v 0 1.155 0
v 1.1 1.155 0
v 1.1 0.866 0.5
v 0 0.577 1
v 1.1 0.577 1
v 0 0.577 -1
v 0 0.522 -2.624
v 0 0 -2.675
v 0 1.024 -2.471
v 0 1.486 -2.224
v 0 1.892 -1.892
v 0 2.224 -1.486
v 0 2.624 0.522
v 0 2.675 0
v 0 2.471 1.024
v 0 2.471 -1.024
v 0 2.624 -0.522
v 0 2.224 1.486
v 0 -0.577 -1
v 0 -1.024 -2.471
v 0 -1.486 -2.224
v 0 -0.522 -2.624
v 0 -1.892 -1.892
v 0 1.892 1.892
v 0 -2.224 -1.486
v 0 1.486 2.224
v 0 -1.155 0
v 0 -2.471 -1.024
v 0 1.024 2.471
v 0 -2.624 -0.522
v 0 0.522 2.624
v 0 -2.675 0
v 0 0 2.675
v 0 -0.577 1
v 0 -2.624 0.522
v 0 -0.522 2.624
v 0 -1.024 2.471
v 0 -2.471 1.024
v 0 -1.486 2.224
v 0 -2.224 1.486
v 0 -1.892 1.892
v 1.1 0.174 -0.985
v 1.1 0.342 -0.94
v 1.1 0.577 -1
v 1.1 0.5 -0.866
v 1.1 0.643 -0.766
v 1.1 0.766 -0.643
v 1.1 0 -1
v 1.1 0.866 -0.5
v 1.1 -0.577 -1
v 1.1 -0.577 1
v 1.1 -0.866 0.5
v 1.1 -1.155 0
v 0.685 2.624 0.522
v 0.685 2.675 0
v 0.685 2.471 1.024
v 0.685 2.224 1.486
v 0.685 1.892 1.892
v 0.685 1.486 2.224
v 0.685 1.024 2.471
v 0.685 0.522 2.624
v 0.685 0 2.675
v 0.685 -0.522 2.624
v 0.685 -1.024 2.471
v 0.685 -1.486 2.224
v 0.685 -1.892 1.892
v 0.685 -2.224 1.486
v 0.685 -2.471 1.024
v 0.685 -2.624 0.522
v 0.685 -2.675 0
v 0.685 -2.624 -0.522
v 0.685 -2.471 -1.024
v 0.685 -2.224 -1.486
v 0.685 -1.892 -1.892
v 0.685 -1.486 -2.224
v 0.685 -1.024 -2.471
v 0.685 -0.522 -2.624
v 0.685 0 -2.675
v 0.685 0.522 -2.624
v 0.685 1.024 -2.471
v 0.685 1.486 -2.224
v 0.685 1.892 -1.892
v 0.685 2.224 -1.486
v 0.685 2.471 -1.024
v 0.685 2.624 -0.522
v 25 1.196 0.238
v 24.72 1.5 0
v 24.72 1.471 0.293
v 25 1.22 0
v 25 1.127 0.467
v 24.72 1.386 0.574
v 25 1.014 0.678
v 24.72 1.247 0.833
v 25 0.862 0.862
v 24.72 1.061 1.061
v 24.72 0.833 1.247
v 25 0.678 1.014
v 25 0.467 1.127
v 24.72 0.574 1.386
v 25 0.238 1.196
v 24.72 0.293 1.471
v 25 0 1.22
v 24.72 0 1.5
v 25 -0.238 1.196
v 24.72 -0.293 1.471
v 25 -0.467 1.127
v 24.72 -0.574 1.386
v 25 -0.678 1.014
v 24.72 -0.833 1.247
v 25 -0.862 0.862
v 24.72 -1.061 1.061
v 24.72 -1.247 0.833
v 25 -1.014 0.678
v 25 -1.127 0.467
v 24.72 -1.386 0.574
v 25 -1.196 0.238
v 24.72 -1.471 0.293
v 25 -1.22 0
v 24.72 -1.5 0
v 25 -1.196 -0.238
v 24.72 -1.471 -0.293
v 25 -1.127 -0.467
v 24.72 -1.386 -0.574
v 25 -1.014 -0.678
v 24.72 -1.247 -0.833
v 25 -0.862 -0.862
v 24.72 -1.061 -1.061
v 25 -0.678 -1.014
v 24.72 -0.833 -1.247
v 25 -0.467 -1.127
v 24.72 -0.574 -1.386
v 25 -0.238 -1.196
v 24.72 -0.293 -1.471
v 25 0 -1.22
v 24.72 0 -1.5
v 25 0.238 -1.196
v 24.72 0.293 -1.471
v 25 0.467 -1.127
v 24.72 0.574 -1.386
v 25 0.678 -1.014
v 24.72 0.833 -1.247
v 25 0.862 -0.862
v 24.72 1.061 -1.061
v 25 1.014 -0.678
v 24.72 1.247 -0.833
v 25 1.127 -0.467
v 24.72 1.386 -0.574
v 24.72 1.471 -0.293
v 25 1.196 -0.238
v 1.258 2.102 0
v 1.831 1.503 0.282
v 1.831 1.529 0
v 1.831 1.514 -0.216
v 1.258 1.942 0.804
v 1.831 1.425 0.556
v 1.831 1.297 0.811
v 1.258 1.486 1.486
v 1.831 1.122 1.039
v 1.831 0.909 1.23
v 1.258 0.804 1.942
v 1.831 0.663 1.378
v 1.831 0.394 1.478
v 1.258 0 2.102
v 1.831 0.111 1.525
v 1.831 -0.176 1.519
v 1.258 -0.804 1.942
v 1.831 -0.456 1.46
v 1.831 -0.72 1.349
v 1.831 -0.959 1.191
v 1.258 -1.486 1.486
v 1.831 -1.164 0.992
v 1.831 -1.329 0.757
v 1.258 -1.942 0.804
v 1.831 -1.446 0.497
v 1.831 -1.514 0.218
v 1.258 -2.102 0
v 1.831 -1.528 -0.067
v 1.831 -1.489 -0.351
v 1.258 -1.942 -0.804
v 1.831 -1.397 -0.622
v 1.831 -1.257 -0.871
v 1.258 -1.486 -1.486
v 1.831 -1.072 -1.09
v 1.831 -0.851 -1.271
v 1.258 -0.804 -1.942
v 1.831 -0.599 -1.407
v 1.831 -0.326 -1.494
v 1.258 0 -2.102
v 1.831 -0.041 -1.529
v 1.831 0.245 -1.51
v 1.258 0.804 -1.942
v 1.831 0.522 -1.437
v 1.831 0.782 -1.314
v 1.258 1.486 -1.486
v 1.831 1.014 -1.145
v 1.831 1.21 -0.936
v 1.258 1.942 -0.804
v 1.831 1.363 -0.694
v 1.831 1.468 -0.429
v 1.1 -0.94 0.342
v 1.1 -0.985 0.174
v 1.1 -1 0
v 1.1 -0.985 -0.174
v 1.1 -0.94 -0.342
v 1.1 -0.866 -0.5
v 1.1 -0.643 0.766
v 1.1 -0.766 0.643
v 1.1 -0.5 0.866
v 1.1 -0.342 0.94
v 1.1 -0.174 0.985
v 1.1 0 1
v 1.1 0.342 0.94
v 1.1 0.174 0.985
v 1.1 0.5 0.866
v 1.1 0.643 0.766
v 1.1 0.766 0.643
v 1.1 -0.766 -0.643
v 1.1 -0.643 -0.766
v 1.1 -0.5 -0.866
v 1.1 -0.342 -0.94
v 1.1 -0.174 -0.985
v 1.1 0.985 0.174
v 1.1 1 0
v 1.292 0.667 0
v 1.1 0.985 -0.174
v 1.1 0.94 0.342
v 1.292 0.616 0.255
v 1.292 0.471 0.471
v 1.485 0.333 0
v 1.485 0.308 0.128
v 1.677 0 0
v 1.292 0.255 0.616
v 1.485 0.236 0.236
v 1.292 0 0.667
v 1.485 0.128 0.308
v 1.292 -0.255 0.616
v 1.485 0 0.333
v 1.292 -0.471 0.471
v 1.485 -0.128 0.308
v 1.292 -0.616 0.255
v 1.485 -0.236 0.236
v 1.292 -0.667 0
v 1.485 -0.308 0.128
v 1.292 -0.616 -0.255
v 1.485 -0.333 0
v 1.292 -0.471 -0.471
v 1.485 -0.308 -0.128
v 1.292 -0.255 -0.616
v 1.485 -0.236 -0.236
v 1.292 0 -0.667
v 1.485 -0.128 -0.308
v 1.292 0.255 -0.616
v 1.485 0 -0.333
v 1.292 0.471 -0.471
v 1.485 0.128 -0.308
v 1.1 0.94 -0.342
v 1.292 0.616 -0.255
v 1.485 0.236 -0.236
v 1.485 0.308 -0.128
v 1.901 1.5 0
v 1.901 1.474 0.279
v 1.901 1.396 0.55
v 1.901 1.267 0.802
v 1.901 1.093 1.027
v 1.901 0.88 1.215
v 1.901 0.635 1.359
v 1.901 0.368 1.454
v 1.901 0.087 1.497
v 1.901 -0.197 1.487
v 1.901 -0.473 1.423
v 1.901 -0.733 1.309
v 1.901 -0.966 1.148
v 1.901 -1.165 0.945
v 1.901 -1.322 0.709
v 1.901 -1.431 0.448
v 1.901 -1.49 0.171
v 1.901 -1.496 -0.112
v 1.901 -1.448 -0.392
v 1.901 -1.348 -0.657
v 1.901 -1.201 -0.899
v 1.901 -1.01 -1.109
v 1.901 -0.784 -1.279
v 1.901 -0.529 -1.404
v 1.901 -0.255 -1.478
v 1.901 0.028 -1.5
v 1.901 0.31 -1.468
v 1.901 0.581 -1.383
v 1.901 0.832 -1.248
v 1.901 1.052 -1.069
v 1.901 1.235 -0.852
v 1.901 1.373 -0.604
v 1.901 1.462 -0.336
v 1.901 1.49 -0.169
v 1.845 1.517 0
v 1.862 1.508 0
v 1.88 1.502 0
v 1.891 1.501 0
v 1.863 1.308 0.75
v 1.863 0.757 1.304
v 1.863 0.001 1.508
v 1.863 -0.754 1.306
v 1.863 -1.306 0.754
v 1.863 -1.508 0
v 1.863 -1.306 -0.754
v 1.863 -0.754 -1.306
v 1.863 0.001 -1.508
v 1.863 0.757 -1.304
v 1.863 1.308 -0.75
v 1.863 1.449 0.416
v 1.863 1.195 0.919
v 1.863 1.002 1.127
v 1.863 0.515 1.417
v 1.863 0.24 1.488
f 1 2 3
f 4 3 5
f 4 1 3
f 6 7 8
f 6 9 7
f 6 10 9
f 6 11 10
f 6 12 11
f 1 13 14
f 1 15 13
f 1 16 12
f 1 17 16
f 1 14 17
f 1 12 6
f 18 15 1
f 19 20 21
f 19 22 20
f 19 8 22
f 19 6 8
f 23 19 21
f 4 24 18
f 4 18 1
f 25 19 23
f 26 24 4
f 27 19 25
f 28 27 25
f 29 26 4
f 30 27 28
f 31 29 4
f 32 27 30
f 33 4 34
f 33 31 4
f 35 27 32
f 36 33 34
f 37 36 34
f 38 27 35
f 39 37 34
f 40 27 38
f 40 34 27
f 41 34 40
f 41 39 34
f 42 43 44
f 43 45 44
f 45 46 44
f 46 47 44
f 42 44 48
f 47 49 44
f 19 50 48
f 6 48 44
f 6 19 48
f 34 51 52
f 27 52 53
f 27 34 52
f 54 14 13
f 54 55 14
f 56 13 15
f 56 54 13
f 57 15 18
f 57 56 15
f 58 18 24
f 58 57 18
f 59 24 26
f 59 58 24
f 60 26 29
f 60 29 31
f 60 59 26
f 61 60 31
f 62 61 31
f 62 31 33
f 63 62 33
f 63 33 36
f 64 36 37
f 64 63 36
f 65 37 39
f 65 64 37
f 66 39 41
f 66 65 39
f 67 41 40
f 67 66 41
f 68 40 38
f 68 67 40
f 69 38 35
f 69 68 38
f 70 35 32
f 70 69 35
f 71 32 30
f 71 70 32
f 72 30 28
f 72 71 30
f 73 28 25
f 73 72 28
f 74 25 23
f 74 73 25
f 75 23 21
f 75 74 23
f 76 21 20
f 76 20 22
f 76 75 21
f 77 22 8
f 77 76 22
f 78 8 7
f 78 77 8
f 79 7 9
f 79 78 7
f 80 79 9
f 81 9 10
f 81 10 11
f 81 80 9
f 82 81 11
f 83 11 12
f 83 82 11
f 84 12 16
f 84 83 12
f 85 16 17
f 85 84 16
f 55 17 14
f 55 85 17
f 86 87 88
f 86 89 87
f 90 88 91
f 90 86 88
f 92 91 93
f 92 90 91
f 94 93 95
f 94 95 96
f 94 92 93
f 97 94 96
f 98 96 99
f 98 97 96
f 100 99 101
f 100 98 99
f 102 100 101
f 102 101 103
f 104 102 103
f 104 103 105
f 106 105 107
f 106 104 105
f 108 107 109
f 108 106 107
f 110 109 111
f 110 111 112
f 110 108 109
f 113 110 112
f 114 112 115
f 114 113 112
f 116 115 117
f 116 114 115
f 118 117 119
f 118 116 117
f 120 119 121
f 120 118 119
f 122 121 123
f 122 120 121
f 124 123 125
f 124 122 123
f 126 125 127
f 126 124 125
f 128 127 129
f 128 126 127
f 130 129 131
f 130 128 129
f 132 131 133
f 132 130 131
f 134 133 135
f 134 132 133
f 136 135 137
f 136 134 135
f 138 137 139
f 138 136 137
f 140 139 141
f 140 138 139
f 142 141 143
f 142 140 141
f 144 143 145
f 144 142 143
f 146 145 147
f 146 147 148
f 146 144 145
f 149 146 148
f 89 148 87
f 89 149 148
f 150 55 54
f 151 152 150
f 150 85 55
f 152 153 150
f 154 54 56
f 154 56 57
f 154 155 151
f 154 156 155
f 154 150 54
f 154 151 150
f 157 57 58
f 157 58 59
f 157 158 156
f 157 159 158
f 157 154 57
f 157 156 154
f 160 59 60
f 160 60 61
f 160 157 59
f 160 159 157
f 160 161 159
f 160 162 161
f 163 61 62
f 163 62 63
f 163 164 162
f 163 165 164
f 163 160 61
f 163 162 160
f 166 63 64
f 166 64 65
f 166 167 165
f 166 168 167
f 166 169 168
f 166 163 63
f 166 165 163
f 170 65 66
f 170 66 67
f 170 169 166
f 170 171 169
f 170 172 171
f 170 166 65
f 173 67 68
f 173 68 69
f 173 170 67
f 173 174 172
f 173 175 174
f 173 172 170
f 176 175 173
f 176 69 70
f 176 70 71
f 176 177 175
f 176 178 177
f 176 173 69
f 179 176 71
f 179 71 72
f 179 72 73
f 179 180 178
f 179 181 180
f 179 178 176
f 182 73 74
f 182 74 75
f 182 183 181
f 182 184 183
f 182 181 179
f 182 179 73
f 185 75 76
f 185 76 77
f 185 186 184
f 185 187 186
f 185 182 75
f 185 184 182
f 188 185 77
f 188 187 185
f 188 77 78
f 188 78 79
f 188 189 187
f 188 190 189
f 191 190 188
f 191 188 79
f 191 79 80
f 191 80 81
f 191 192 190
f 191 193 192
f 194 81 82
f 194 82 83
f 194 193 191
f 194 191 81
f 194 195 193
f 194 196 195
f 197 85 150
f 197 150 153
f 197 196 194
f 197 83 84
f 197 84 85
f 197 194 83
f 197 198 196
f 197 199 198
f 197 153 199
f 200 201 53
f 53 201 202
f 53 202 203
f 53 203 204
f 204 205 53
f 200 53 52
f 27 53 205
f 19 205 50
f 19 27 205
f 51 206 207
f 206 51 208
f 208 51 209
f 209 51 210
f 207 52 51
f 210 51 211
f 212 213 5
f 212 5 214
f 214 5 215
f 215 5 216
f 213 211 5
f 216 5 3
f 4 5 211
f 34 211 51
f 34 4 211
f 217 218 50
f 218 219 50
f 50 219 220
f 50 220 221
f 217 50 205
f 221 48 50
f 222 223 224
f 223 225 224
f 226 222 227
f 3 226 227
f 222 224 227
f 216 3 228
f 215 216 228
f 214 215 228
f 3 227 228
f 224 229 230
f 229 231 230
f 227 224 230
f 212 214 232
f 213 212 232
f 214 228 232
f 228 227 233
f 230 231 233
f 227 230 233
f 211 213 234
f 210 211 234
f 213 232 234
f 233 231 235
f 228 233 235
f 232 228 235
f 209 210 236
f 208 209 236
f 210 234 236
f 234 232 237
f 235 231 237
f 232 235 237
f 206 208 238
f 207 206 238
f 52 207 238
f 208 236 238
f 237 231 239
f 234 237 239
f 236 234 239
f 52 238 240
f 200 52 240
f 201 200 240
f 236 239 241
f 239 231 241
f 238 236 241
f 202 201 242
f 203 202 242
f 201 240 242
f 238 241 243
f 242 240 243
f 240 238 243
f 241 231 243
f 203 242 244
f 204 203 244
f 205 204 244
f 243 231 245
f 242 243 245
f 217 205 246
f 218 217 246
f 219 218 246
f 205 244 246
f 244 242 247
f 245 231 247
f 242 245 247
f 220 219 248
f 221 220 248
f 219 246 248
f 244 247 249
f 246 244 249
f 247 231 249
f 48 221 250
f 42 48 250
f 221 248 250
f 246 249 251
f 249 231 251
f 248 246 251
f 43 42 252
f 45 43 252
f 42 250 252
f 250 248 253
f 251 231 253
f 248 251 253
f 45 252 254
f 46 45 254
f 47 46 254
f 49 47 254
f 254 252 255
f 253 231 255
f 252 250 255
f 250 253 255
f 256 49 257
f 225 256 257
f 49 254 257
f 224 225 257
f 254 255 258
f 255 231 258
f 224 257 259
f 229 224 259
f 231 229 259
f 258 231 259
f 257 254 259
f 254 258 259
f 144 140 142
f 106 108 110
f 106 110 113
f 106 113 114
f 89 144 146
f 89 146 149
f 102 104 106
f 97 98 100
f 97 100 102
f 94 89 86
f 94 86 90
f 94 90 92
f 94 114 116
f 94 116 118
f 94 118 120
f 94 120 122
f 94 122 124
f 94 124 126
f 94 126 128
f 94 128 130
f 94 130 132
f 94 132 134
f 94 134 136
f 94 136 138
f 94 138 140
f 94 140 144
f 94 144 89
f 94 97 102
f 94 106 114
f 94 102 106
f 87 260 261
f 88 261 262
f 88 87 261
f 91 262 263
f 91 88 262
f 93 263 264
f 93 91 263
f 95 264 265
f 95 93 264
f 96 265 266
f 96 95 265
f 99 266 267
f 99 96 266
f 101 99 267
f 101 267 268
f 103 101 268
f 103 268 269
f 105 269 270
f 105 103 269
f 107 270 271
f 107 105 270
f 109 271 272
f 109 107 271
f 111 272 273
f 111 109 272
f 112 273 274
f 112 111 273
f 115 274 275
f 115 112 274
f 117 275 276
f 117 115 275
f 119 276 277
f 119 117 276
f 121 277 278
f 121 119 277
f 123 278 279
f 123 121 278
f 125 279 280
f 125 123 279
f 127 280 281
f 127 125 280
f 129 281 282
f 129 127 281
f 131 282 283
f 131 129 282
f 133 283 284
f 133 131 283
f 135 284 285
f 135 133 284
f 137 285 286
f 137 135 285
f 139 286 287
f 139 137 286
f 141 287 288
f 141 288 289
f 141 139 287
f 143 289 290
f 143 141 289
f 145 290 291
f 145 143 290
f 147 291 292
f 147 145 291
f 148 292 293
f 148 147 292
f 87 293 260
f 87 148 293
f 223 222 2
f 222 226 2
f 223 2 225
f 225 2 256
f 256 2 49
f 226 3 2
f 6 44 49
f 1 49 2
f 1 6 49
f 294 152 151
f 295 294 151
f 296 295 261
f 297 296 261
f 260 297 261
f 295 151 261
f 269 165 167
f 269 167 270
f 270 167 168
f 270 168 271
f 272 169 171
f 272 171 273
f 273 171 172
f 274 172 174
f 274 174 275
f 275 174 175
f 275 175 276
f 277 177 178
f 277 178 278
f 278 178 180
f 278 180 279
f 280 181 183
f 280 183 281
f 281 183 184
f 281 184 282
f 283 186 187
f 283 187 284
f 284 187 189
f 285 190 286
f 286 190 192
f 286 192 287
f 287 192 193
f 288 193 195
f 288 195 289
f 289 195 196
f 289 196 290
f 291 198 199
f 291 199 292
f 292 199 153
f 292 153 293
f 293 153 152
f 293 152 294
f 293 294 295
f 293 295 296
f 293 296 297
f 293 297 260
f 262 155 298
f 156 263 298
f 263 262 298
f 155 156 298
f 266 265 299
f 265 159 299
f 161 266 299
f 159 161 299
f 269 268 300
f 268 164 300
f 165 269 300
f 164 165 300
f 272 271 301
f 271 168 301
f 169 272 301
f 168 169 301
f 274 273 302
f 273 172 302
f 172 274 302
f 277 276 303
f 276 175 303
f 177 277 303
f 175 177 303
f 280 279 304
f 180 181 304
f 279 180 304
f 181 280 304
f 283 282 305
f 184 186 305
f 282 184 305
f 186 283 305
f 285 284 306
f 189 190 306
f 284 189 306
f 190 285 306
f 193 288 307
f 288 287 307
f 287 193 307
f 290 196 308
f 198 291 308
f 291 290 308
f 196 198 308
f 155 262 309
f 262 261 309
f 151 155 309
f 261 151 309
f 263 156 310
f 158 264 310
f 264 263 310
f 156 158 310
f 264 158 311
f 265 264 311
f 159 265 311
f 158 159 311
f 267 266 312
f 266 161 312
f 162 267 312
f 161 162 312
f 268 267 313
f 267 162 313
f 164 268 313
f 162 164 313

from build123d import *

# Parameters (mm, degrees)
FILLET1_R   = 0.1
HEX_2_DEPTH = 1.1


with BuildPart() as part:
    # BodySke → BaseBody (revolve)
    with BuildSketch(Plane.XY):
        Polygon((0, 0), (0, 2.675), (0.685, 2.675), (1.86, 1.5), (24.7195, 1.5), (25, 1.2195), (25, 0), align=None)
    revolve(axis=Axis((0, 0, 0), (1, 0, 0)))

    # Fillet1
    fillet1_edges = [part.edges().sort_by_distance(p)[0] for p in [
        (1.86, -1.5, 0),
    ]]
    fillet(fillet1_edges, radius=FILLET1_R)

    # Sketch2 → PreBroach (revolve, cut)
    with BuildSketch(Plane.XY):
        Polygon((0, 1), (1.1, 1), (1.677350269, 0), (0, 0), align=None)
    revolve(axis=Axis((0, 0, 0), (1, 0, 0)), mode=Mode.SUBTRACT)

    # Sketch3 → Hex 2 (cut)
    with BuildSketch(Plane.ZY):
        Polygon((-1, -0.577350269), (-1, 0.577350269), (0, 1.154700538), (1, 0.577350269), (1, -0.577350269), (0, -1.154700538), align=None)
    extrude(amount=-HEX_2_DEPTH, mode=Mode.SUBTRACT)


solid = part.part
